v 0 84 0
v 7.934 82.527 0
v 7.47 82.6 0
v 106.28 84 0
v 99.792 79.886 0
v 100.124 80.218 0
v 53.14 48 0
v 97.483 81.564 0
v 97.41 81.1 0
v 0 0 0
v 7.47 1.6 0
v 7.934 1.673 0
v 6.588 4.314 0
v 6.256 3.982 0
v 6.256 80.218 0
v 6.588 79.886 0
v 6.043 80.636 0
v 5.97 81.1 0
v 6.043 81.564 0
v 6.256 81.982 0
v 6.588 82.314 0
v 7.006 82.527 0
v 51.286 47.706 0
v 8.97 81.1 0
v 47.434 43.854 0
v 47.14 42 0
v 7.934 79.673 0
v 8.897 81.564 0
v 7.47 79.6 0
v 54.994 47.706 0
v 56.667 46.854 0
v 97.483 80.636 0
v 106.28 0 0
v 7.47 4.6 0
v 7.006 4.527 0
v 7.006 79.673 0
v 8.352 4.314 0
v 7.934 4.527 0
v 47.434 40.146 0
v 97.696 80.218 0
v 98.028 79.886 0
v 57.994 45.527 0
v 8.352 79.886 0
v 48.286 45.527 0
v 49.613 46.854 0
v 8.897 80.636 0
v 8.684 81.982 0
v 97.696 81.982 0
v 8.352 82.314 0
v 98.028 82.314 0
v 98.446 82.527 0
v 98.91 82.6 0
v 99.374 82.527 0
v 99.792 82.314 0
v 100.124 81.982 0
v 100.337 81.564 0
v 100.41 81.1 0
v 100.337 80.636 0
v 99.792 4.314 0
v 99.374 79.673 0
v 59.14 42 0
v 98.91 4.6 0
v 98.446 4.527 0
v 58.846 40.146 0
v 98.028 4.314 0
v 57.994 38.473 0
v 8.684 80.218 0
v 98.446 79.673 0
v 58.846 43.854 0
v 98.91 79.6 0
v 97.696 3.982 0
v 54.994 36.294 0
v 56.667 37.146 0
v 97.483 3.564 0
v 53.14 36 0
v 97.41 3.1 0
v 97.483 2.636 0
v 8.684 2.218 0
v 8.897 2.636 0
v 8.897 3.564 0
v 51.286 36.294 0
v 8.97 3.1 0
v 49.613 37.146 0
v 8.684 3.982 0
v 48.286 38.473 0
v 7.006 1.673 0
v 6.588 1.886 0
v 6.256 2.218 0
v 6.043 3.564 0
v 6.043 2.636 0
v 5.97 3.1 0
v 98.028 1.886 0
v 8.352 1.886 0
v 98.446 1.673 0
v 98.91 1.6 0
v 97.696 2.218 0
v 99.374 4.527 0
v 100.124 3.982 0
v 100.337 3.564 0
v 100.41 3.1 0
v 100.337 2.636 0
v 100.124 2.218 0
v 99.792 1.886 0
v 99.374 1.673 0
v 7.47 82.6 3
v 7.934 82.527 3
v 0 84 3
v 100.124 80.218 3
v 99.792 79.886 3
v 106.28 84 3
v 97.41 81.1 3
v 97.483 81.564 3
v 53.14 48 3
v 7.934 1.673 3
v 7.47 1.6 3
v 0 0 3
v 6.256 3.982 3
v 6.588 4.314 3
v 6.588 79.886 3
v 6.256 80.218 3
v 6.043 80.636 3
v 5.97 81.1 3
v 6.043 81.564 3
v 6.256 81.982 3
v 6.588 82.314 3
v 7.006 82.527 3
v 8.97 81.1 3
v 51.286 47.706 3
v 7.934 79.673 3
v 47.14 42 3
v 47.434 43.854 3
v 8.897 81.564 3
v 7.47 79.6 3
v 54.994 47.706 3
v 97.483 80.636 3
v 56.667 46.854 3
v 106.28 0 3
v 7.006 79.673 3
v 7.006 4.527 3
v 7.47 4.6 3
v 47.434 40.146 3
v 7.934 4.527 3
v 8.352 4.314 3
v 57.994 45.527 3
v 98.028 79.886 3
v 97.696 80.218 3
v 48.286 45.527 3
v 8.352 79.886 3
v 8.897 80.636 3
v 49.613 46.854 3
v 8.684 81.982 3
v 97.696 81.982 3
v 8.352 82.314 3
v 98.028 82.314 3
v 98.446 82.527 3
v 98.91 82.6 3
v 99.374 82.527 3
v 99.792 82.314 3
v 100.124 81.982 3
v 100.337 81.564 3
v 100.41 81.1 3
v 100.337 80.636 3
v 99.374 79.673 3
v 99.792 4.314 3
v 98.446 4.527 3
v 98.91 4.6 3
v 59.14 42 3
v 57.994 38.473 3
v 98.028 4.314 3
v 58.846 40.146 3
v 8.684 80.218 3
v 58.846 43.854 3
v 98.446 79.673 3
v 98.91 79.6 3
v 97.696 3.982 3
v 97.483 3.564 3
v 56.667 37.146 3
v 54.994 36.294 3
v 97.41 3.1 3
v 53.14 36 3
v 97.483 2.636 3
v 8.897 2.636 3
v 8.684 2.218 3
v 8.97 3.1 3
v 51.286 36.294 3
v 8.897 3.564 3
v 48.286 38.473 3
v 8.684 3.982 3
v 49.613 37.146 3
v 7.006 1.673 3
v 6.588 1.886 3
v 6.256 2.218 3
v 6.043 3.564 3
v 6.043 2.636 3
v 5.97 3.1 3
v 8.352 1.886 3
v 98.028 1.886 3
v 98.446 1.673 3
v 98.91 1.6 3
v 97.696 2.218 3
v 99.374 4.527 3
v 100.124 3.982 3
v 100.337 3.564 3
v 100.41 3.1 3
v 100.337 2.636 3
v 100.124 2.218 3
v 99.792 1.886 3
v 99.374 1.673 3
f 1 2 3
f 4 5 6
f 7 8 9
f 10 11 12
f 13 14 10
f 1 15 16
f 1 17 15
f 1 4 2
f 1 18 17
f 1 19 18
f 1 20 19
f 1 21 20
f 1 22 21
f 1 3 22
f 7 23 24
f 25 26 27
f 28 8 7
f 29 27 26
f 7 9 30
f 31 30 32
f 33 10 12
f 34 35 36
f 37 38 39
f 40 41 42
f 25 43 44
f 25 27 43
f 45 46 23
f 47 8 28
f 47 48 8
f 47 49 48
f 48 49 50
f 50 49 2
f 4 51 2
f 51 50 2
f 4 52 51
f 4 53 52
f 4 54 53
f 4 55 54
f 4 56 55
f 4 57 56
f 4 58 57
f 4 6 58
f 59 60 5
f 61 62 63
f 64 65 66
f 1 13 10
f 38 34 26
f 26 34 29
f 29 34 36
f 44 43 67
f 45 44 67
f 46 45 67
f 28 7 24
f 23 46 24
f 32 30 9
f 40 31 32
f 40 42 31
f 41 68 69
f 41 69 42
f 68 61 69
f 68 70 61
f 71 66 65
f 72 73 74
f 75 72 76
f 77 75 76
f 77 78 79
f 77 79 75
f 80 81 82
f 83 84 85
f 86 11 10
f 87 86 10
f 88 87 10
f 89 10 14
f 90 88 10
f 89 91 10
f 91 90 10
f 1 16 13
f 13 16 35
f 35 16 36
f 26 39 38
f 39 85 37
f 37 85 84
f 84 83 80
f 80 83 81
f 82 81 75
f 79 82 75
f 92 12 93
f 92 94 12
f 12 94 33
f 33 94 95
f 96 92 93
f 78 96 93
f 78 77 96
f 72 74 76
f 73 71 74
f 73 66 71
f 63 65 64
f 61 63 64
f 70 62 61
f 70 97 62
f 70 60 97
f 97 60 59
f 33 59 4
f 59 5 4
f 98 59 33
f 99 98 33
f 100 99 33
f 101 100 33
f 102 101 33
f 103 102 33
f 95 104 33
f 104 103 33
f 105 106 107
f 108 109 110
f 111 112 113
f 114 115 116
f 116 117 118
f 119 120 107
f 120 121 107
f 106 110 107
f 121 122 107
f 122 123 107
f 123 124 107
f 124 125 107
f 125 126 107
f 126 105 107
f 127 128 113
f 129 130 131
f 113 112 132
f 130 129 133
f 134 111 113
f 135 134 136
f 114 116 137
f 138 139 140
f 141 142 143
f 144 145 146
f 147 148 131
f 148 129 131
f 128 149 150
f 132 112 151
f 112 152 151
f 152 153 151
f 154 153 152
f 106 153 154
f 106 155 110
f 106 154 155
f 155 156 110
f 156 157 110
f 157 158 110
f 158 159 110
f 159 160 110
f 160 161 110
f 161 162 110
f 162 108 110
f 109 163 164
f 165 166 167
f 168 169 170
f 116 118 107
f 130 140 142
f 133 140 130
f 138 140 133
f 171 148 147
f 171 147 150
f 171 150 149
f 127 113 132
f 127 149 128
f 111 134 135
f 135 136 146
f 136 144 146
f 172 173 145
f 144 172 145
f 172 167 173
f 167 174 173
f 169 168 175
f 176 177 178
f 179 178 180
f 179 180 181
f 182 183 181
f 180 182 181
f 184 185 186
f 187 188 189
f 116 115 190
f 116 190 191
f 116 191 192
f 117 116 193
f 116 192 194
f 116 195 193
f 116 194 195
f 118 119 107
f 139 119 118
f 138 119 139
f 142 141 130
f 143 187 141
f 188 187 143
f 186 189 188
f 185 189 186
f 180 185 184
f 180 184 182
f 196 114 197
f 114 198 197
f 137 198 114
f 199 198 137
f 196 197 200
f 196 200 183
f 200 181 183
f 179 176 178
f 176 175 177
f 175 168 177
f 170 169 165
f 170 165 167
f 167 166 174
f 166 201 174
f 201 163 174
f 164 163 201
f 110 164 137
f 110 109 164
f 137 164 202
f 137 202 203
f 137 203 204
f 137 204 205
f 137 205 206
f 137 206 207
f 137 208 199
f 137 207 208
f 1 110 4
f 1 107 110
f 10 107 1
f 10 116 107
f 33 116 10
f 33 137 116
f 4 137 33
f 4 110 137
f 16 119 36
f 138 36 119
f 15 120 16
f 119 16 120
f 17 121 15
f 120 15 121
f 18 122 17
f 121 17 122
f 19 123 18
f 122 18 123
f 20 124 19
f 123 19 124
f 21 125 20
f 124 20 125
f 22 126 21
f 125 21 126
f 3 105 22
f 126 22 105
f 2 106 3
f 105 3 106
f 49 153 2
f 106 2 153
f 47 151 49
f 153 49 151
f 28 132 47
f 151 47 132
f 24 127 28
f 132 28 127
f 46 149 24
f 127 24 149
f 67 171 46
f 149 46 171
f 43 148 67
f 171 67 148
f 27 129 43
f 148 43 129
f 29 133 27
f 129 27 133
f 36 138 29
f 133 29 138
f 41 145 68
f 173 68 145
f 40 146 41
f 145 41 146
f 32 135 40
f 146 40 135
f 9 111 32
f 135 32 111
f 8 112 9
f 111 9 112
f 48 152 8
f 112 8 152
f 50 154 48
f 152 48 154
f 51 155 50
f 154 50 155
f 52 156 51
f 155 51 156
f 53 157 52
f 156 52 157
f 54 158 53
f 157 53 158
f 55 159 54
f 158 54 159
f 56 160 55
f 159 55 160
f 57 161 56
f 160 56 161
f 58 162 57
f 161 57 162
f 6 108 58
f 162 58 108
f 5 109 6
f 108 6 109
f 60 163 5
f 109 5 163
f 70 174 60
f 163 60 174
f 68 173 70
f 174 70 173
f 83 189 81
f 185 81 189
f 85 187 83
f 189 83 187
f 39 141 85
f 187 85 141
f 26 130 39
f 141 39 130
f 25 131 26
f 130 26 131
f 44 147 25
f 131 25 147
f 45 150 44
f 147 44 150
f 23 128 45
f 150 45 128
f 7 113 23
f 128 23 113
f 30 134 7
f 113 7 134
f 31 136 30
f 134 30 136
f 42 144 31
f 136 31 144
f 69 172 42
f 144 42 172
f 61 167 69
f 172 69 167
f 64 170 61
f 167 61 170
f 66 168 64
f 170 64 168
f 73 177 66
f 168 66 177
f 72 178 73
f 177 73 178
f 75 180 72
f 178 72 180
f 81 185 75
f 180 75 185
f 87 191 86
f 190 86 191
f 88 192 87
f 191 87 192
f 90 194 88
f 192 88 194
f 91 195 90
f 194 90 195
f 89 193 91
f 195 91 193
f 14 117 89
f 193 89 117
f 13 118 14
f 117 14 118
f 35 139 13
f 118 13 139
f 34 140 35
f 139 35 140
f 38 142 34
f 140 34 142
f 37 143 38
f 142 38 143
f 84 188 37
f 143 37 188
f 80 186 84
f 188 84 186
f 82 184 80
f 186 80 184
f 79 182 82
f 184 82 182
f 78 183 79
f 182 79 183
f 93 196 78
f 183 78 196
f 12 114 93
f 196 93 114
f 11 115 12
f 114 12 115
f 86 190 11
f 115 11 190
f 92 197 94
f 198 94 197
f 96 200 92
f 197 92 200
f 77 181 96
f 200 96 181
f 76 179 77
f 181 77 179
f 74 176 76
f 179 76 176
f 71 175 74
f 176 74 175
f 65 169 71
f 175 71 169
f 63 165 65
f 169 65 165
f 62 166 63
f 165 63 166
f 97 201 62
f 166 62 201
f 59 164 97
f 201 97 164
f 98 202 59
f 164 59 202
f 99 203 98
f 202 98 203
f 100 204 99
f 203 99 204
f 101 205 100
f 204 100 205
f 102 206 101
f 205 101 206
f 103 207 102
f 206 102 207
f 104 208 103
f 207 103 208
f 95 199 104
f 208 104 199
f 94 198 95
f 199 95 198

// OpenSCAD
// file: panel.scad
$fn = 20;
U = 3;
T = 16;

h = U * 44.5 - 5;
w = T * 5.08 - 2*.2;

m_x = 7.47;
//m_x = 0;
m_y = 3.1;
m_d = 3;

F = U * 44.5 + (122.5 - 3 * 44.5);

echo(w);

module hole() {
//    hull() {
    //circle(d=m_d);
    translate([5.08/2,0]) circle(d=m_d);
//    }
}

module holes() {
    translate([m_x, m_y]) hole();
    translate([m_x, m_y + F]) hole();
}

module panel() {
    difference() {
    square([w, h]);
        holes();
        if(T>6) {
            translate([(T-3) * 5.08 - 5.08, 0]) holes();
        }
        translate([(T-24) * 5.08, 0]) holes();
    }
}

//panel();

//#square([46,62]);
//#import("jr-module-bay-cover.stl");
// main file
//include "panel.scad";



include <panel.scad>

U = 2;
T = 21;

difference() {
linear_extrude(3)
difference() {
    panel();
    
    translate([w/2,h/2])
    intersection() {
       circle(d=12, true);
       square([20,22],true);
    }
    
}




// translate([12,h/2 - 10,1])
// linear_extrude(5,true)
// scale(0.9)
// import("svg/logo_simba_4.svg");

}
